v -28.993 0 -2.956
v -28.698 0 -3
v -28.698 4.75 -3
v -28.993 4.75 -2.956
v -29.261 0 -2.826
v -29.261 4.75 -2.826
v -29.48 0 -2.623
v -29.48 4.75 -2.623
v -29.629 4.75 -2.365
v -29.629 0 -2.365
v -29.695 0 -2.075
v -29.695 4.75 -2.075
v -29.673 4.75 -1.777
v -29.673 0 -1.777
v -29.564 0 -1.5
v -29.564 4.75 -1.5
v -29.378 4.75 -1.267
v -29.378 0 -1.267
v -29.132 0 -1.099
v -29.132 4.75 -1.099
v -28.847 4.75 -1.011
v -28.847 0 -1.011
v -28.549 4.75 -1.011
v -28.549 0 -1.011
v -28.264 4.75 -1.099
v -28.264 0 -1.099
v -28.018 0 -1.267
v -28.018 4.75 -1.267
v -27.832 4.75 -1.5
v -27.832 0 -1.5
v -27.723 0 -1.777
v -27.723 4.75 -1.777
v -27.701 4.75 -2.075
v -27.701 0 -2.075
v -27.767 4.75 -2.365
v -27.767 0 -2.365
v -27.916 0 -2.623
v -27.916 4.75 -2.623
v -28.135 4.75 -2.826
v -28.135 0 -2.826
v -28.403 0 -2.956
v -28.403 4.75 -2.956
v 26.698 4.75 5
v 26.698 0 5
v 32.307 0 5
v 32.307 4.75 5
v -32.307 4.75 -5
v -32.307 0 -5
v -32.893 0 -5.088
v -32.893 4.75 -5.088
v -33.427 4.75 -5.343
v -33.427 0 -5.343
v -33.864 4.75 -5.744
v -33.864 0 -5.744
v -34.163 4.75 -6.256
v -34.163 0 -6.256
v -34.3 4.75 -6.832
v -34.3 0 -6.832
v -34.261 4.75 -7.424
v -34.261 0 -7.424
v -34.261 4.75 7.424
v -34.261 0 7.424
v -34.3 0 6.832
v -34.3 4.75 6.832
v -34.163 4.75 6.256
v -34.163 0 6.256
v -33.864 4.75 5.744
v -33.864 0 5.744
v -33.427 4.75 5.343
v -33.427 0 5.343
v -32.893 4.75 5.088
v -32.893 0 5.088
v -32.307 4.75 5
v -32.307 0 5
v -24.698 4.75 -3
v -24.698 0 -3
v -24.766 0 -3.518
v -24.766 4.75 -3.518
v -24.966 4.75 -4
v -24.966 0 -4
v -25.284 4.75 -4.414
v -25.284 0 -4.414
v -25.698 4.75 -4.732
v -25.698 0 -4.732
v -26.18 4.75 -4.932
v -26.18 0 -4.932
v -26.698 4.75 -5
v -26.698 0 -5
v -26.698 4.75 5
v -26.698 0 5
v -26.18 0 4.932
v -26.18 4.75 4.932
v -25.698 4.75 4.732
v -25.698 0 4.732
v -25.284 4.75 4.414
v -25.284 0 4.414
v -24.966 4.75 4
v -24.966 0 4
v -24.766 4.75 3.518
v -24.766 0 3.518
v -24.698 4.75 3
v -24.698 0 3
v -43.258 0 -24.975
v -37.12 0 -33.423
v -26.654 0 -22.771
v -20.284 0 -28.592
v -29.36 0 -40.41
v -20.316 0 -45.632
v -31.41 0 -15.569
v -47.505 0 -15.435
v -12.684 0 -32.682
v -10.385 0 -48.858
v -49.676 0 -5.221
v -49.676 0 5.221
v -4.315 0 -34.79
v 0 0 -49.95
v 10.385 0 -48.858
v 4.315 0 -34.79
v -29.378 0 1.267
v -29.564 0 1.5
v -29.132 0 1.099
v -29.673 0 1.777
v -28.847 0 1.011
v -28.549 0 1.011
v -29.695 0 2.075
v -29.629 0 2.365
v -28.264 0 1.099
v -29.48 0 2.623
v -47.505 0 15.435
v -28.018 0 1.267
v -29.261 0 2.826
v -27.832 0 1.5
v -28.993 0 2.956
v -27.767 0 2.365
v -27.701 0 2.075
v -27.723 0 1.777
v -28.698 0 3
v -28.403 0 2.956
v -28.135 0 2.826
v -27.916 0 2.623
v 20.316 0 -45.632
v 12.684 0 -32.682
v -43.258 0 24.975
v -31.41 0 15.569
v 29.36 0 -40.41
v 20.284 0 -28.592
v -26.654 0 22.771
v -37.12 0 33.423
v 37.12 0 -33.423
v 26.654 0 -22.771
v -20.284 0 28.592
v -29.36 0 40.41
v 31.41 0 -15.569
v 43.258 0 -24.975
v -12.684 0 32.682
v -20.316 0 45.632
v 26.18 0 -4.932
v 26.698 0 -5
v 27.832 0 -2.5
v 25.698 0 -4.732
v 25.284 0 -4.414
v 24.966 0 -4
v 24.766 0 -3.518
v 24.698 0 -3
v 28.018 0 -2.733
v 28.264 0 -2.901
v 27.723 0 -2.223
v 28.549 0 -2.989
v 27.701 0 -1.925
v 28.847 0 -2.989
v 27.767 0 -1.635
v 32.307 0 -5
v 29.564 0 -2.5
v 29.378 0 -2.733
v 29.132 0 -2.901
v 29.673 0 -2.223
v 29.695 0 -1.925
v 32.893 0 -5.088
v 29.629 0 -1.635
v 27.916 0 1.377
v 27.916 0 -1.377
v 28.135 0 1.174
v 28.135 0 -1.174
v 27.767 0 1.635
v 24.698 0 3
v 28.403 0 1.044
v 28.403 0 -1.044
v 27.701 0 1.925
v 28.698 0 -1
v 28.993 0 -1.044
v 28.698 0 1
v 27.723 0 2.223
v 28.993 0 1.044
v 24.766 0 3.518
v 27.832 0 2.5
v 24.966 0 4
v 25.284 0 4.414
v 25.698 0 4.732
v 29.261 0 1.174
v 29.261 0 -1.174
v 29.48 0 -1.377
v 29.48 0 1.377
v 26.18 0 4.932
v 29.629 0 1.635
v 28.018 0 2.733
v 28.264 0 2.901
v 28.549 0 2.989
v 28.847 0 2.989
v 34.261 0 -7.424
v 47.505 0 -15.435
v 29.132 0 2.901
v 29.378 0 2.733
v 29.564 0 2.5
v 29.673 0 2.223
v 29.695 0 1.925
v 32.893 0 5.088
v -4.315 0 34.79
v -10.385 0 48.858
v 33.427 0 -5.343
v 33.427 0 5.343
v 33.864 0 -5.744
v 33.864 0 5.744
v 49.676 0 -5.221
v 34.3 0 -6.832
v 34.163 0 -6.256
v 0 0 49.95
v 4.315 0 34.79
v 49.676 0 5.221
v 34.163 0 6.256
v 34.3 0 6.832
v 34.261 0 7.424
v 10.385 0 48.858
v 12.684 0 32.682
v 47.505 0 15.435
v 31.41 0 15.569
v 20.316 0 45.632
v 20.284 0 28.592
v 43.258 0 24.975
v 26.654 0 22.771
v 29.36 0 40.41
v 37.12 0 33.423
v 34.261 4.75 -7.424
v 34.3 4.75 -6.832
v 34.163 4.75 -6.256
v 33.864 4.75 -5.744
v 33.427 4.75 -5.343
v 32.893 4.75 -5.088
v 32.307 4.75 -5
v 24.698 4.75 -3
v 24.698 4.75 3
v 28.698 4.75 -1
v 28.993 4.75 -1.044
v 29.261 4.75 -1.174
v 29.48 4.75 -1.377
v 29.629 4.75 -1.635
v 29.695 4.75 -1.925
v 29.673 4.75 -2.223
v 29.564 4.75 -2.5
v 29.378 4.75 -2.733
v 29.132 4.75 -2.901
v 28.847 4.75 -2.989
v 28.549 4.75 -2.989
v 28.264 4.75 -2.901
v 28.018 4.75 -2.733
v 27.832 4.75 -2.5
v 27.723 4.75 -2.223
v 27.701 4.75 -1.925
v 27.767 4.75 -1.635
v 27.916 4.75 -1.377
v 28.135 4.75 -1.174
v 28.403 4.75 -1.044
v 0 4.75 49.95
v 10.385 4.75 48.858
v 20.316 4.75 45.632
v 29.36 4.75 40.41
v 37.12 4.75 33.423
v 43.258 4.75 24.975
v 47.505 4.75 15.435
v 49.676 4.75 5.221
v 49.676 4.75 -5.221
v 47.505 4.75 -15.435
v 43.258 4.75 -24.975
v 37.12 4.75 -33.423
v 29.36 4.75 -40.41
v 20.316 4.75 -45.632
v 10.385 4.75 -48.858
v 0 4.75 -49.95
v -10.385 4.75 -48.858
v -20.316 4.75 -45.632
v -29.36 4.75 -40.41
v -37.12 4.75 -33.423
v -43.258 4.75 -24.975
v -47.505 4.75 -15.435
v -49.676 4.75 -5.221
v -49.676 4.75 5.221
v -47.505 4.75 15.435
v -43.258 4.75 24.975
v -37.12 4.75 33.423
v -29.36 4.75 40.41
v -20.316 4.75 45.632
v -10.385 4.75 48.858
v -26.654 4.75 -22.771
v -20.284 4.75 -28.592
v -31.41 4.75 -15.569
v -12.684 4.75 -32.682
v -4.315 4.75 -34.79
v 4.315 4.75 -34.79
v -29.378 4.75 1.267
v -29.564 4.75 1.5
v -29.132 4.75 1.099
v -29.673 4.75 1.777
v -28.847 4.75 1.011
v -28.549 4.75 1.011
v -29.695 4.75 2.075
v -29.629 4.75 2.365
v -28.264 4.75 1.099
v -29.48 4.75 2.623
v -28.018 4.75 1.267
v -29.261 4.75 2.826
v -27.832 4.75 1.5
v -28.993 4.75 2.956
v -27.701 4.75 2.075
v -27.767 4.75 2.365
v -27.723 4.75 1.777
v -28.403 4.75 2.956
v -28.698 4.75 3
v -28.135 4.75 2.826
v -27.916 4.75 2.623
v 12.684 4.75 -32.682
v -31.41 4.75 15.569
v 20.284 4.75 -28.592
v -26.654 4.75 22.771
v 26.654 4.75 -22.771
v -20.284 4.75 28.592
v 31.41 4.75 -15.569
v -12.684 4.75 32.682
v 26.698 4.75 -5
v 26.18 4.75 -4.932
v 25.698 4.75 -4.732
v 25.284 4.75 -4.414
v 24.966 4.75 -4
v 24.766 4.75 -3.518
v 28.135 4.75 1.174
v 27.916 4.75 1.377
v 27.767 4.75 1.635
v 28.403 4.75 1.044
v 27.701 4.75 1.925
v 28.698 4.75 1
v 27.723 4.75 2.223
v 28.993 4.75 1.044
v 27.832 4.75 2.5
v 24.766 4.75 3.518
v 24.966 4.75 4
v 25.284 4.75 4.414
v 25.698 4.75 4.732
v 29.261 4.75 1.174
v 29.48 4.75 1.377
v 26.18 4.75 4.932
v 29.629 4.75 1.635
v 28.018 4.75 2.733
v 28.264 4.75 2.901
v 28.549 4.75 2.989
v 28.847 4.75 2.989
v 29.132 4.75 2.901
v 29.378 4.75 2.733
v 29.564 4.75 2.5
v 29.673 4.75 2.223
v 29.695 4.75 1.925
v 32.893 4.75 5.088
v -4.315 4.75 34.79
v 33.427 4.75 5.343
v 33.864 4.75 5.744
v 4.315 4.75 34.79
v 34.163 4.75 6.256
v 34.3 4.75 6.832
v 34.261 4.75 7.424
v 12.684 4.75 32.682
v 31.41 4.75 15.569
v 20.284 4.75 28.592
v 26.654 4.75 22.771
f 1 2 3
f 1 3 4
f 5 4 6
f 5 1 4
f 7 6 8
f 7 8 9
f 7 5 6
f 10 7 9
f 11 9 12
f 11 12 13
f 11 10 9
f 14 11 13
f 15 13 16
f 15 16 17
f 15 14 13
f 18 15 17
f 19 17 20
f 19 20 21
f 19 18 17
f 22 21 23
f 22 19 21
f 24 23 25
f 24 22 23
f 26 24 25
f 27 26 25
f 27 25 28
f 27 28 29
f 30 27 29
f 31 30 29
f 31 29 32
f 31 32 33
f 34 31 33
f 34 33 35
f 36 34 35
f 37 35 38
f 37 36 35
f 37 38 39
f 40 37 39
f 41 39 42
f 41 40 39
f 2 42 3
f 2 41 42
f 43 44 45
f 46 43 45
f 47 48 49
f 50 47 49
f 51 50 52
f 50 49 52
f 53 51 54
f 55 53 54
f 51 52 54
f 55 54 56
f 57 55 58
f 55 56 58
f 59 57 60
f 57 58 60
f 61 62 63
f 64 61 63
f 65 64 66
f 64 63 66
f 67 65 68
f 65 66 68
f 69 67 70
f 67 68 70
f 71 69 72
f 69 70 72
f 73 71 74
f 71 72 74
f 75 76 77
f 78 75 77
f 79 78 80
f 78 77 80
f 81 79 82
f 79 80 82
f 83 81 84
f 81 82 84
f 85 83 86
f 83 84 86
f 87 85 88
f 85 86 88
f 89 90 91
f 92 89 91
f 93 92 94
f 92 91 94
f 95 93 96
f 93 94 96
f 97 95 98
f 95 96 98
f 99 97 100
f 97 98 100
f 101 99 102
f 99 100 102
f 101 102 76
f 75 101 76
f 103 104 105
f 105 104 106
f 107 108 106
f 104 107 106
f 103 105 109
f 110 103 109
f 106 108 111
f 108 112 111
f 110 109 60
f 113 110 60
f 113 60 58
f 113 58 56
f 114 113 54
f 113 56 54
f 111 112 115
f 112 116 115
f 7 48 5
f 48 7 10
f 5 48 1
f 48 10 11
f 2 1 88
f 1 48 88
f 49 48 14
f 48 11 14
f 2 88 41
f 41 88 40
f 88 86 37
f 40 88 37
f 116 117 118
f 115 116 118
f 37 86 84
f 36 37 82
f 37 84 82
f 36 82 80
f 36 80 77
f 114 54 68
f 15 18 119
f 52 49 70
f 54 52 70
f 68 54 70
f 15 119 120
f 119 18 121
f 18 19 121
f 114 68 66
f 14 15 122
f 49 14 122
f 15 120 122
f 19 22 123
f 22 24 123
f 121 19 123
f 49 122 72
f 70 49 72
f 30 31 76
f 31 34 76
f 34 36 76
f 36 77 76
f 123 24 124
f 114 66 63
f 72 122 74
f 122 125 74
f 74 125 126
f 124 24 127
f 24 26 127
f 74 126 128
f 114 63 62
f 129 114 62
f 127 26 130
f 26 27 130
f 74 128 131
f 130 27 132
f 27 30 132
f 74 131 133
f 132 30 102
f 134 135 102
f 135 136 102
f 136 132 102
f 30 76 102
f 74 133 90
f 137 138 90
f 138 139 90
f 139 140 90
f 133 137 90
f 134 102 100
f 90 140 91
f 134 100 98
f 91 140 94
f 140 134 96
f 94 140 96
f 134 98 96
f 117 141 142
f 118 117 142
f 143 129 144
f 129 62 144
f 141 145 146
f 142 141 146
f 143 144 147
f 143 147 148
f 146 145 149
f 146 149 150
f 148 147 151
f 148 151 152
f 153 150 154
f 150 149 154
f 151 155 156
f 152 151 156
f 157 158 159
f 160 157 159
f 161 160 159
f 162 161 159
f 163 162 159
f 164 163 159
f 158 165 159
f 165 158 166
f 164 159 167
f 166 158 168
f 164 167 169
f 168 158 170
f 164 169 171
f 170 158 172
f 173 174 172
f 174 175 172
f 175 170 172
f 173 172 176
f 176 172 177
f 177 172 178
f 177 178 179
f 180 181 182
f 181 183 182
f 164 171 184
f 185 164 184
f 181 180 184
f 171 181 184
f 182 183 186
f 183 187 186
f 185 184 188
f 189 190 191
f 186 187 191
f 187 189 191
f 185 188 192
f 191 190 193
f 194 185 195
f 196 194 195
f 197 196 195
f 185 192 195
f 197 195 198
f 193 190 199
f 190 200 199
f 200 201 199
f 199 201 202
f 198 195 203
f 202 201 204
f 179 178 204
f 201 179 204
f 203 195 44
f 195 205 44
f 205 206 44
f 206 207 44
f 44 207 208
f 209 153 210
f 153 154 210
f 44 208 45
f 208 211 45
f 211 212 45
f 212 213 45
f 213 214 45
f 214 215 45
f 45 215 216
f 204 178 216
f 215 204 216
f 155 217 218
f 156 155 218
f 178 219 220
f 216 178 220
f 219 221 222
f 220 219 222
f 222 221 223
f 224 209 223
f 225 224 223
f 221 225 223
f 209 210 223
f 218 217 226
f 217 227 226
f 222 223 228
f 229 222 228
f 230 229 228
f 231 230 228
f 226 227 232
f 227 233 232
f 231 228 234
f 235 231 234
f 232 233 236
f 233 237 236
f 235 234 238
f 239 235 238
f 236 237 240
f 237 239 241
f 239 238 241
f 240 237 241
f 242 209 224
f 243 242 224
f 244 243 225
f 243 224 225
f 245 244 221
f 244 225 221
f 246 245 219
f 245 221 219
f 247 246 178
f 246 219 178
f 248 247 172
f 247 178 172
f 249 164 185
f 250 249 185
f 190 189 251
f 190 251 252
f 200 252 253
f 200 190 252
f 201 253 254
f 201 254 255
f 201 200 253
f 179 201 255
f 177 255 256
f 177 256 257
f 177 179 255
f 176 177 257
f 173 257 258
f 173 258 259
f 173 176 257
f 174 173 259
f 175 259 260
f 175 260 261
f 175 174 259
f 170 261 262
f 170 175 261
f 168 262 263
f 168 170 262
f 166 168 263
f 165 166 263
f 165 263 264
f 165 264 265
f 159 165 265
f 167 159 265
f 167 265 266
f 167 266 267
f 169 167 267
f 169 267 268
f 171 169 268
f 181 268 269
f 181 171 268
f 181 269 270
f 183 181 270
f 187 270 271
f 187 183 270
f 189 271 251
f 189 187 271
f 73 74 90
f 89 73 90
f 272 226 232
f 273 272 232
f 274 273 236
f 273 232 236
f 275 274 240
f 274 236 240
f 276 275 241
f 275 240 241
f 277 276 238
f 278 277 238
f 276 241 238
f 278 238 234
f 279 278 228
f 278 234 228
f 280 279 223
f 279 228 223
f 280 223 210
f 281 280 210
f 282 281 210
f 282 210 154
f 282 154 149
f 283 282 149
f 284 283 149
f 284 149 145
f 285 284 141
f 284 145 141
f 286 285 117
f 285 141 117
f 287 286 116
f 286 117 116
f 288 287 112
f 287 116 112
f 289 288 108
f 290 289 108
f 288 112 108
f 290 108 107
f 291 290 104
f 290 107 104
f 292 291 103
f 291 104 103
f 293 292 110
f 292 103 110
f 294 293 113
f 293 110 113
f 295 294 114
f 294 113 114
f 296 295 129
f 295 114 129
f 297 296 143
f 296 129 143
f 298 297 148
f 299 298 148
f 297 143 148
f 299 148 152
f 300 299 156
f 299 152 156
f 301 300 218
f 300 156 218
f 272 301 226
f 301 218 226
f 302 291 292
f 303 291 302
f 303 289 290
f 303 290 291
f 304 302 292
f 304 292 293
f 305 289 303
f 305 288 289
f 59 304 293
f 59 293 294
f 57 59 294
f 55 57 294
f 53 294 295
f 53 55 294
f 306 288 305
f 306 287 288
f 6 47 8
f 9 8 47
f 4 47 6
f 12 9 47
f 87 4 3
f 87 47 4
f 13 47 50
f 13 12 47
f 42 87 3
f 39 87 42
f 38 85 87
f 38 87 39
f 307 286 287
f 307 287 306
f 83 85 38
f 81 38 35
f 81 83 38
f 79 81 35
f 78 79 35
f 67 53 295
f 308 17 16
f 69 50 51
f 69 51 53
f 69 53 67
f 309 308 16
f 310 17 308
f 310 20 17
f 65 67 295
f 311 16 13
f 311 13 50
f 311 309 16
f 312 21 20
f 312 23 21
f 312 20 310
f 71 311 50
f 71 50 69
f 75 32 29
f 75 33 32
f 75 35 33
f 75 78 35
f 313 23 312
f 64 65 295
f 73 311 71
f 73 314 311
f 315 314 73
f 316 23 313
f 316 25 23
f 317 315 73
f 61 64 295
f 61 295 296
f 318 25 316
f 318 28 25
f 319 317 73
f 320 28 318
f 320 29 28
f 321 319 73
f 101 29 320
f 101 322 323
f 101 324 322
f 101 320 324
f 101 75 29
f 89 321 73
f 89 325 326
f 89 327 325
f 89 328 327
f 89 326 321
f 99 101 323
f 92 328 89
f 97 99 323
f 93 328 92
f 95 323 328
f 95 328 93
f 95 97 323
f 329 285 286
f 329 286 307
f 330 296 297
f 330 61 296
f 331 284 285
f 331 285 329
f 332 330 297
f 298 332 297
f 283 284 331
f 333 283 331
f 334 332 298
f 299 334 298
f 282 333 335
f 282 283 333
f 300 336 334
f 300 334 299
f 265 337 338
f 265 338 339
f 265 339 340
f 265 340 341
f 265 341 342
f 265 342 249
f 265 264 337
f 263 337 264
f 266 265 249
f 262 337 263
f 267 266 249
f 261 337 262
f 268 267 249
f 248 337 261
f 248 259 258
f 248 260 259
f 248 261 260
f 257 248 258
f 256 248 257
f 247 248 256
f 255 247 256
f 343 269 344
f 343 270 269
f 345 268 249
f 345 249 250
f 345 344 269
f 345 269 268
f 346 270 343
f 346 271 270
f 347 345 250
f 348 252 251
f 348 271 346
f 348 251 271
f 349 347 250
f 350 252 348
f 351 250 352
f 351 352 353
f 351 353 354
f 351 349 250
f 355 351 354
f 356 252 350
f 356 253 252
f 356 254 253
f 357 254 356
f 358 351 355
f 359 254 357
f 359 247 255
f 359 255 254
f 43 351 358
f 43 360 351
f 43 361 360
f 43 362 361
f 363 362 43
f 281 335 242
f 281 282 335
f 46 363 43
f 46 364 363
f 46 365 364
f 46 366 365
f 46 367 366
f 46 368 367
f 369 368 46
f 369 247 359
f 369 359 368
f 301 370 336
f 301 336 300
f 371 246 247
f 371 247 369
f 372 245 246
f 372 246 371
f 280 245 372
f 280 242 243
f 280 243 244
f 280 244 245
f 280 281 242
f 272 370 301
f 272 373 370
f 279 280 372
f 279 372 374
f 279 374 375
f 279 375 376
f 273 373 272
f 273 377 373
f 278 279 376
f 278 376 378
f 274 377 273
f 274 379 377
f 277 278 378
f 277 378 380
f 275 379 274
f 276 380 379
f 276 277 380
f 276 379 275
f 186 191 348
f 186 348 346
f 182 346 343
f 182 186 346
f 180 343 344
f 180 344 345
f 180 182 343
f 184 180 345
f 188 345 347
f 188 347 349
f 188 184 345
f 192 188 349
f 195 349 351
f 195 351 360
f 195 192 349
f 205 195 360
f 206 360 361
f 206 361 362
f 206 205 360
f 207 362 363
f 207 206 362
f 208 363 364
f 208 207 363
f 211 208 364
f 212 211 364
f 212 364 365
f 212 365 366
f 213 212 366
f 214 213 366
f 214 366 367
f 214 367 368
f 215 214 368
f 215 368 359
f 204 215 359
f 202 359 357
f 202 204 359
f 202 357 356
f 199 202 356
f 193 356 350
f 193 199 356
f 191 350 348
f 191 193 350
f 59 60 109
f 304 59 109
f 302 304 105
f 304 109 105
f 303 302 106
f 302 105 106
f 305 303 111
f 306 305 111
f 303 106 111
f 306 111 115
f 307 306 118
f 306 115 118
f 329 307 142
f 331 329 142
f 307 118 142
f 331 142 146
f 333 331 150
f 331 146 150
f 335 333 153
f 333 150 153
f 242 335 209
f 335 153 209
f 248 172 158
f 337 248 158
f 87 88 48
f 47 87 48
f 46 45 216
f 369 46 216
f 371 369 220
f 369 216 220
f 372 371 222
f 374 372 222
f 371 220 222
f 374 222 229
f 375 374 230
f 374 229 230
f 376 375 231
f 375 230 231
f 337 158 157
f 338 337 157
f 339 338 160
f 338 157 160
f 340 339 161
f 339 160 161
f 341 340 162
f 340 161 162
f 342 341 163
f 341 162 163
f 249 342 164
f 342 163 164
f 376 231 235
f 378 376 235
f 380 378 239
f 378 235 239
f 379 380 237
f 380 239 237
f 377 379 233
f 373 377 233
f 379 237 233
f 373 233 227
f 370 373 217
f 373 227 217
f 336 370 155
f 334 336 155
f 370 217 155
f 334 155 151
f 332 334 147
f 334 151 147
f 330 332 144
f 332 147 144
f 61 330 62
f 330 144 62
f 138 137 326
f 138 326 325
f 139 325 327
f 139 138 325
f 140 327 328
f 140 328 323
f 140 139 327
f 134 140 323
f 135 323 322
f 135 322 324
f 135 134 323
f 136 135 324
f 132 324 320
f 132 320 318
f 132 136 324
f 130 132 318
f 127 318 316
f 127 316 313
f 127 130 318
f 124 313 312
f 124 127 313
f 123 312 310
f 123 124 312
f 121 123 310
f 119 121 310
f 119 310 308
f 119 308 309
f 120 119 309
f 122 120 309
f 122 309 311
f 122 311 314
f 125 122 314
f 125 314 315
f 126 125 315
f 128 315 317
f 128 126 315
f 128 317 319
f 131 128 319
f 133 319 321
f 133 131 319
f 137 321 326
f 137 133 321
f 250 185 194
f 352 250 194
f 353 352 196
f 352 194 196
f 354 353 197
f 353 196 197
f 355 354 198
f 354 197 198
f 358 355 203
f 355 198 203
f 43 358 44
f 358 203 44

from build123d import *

# Parameters (mm, degrees)
SKETCH1_R           = 49.95
SKETCH1_R_2         = 1
BOSS_EXTRUDE1_DEPTH = 4.75


with BuildPart() as part:
    # Sketch1 → Boss-Extrude1 (new body)
    with BuildSketch(Plane(origin=(0, 0, 0), x_dir=(1, 0, 0), z_dir=(0, 1, 0))):
        Circle(SKETCH1_R)
        with Locations((-28.698085879, -2)):
            Circle(SKETCH1_R_2, mode=Mode.SUBTRACT)
        with Locations((-28.698085879, 2)):
            Circle(SKETCH1_R_2, mode=Mode.SUBTRACT)
        with Locations((28.698085879, -2)):
            Circle(SKETCH1_R_2, mode=Mode.SUBTRACT)
        with Locations((28.698085879, 2)):
            Circle(SKETCH1_R_2, mode=Mode.SUBTRACT)
        with BuildLine():
            Line((-32.306829346, -5), (-26.698085879, -5))
            ThreePointArc((-26.698085879, -5), (-25.283872317, -4.414213562), (-24.698085879, -3))
            Line((-24.698085879, -3), (-24.698085879, 3))
            ThreePointArc((-24.698085879, 3), (-25.283872317, 4.414213562), (-26.698085879, 5))
            Line((-26.698085879, 5), (-32.306829346, 5))
            ThreePointArc((-32.306829346, 5), (-33.863594421, 5.744419457), (-34.261473284, 7.423517499))
            ThreePointArc((-34.261473284, 7.423517499), (0, 35.05648533), (34.261473284, 7.423517499))
            ThreePointArc((34.261473284, 7.423517499), (33.863594421, 5.744419457), (32.306829346, 5))
            Line((32.306829346, 5), (26.698085879, 5))
            ThreePointArc((26.698085879, 5), (25.283872317, 4.414213562), (24.698085879, 3))
            Line((24.698085879, 3), (24.698085879, -3))
            ThreePointArc((24.698085879, -3), (25.283872317, -4.414213562), (26.698085879, -5))
            Line((26.698085879, -5), (32.306829346, -5))
            ThreePointArc((32.306829346, -5), (33.863594421, -5.744419457), (34.261473284, -7.423517499))
            ThreePointArc((34.261473284, -7.423517499), (0, -35.05648533), (-34.261473284, -7.423517499))
            ThreePointArc((-34.261473284, -7.423517499), (-33.863594421, -5.744419457), (-32.306829346, -5))
        make_face(mode=Mode.SUBTRACT)
    extrude(amount=BOSS_EXTRUDE1_DEPTH)


solid = part.part
